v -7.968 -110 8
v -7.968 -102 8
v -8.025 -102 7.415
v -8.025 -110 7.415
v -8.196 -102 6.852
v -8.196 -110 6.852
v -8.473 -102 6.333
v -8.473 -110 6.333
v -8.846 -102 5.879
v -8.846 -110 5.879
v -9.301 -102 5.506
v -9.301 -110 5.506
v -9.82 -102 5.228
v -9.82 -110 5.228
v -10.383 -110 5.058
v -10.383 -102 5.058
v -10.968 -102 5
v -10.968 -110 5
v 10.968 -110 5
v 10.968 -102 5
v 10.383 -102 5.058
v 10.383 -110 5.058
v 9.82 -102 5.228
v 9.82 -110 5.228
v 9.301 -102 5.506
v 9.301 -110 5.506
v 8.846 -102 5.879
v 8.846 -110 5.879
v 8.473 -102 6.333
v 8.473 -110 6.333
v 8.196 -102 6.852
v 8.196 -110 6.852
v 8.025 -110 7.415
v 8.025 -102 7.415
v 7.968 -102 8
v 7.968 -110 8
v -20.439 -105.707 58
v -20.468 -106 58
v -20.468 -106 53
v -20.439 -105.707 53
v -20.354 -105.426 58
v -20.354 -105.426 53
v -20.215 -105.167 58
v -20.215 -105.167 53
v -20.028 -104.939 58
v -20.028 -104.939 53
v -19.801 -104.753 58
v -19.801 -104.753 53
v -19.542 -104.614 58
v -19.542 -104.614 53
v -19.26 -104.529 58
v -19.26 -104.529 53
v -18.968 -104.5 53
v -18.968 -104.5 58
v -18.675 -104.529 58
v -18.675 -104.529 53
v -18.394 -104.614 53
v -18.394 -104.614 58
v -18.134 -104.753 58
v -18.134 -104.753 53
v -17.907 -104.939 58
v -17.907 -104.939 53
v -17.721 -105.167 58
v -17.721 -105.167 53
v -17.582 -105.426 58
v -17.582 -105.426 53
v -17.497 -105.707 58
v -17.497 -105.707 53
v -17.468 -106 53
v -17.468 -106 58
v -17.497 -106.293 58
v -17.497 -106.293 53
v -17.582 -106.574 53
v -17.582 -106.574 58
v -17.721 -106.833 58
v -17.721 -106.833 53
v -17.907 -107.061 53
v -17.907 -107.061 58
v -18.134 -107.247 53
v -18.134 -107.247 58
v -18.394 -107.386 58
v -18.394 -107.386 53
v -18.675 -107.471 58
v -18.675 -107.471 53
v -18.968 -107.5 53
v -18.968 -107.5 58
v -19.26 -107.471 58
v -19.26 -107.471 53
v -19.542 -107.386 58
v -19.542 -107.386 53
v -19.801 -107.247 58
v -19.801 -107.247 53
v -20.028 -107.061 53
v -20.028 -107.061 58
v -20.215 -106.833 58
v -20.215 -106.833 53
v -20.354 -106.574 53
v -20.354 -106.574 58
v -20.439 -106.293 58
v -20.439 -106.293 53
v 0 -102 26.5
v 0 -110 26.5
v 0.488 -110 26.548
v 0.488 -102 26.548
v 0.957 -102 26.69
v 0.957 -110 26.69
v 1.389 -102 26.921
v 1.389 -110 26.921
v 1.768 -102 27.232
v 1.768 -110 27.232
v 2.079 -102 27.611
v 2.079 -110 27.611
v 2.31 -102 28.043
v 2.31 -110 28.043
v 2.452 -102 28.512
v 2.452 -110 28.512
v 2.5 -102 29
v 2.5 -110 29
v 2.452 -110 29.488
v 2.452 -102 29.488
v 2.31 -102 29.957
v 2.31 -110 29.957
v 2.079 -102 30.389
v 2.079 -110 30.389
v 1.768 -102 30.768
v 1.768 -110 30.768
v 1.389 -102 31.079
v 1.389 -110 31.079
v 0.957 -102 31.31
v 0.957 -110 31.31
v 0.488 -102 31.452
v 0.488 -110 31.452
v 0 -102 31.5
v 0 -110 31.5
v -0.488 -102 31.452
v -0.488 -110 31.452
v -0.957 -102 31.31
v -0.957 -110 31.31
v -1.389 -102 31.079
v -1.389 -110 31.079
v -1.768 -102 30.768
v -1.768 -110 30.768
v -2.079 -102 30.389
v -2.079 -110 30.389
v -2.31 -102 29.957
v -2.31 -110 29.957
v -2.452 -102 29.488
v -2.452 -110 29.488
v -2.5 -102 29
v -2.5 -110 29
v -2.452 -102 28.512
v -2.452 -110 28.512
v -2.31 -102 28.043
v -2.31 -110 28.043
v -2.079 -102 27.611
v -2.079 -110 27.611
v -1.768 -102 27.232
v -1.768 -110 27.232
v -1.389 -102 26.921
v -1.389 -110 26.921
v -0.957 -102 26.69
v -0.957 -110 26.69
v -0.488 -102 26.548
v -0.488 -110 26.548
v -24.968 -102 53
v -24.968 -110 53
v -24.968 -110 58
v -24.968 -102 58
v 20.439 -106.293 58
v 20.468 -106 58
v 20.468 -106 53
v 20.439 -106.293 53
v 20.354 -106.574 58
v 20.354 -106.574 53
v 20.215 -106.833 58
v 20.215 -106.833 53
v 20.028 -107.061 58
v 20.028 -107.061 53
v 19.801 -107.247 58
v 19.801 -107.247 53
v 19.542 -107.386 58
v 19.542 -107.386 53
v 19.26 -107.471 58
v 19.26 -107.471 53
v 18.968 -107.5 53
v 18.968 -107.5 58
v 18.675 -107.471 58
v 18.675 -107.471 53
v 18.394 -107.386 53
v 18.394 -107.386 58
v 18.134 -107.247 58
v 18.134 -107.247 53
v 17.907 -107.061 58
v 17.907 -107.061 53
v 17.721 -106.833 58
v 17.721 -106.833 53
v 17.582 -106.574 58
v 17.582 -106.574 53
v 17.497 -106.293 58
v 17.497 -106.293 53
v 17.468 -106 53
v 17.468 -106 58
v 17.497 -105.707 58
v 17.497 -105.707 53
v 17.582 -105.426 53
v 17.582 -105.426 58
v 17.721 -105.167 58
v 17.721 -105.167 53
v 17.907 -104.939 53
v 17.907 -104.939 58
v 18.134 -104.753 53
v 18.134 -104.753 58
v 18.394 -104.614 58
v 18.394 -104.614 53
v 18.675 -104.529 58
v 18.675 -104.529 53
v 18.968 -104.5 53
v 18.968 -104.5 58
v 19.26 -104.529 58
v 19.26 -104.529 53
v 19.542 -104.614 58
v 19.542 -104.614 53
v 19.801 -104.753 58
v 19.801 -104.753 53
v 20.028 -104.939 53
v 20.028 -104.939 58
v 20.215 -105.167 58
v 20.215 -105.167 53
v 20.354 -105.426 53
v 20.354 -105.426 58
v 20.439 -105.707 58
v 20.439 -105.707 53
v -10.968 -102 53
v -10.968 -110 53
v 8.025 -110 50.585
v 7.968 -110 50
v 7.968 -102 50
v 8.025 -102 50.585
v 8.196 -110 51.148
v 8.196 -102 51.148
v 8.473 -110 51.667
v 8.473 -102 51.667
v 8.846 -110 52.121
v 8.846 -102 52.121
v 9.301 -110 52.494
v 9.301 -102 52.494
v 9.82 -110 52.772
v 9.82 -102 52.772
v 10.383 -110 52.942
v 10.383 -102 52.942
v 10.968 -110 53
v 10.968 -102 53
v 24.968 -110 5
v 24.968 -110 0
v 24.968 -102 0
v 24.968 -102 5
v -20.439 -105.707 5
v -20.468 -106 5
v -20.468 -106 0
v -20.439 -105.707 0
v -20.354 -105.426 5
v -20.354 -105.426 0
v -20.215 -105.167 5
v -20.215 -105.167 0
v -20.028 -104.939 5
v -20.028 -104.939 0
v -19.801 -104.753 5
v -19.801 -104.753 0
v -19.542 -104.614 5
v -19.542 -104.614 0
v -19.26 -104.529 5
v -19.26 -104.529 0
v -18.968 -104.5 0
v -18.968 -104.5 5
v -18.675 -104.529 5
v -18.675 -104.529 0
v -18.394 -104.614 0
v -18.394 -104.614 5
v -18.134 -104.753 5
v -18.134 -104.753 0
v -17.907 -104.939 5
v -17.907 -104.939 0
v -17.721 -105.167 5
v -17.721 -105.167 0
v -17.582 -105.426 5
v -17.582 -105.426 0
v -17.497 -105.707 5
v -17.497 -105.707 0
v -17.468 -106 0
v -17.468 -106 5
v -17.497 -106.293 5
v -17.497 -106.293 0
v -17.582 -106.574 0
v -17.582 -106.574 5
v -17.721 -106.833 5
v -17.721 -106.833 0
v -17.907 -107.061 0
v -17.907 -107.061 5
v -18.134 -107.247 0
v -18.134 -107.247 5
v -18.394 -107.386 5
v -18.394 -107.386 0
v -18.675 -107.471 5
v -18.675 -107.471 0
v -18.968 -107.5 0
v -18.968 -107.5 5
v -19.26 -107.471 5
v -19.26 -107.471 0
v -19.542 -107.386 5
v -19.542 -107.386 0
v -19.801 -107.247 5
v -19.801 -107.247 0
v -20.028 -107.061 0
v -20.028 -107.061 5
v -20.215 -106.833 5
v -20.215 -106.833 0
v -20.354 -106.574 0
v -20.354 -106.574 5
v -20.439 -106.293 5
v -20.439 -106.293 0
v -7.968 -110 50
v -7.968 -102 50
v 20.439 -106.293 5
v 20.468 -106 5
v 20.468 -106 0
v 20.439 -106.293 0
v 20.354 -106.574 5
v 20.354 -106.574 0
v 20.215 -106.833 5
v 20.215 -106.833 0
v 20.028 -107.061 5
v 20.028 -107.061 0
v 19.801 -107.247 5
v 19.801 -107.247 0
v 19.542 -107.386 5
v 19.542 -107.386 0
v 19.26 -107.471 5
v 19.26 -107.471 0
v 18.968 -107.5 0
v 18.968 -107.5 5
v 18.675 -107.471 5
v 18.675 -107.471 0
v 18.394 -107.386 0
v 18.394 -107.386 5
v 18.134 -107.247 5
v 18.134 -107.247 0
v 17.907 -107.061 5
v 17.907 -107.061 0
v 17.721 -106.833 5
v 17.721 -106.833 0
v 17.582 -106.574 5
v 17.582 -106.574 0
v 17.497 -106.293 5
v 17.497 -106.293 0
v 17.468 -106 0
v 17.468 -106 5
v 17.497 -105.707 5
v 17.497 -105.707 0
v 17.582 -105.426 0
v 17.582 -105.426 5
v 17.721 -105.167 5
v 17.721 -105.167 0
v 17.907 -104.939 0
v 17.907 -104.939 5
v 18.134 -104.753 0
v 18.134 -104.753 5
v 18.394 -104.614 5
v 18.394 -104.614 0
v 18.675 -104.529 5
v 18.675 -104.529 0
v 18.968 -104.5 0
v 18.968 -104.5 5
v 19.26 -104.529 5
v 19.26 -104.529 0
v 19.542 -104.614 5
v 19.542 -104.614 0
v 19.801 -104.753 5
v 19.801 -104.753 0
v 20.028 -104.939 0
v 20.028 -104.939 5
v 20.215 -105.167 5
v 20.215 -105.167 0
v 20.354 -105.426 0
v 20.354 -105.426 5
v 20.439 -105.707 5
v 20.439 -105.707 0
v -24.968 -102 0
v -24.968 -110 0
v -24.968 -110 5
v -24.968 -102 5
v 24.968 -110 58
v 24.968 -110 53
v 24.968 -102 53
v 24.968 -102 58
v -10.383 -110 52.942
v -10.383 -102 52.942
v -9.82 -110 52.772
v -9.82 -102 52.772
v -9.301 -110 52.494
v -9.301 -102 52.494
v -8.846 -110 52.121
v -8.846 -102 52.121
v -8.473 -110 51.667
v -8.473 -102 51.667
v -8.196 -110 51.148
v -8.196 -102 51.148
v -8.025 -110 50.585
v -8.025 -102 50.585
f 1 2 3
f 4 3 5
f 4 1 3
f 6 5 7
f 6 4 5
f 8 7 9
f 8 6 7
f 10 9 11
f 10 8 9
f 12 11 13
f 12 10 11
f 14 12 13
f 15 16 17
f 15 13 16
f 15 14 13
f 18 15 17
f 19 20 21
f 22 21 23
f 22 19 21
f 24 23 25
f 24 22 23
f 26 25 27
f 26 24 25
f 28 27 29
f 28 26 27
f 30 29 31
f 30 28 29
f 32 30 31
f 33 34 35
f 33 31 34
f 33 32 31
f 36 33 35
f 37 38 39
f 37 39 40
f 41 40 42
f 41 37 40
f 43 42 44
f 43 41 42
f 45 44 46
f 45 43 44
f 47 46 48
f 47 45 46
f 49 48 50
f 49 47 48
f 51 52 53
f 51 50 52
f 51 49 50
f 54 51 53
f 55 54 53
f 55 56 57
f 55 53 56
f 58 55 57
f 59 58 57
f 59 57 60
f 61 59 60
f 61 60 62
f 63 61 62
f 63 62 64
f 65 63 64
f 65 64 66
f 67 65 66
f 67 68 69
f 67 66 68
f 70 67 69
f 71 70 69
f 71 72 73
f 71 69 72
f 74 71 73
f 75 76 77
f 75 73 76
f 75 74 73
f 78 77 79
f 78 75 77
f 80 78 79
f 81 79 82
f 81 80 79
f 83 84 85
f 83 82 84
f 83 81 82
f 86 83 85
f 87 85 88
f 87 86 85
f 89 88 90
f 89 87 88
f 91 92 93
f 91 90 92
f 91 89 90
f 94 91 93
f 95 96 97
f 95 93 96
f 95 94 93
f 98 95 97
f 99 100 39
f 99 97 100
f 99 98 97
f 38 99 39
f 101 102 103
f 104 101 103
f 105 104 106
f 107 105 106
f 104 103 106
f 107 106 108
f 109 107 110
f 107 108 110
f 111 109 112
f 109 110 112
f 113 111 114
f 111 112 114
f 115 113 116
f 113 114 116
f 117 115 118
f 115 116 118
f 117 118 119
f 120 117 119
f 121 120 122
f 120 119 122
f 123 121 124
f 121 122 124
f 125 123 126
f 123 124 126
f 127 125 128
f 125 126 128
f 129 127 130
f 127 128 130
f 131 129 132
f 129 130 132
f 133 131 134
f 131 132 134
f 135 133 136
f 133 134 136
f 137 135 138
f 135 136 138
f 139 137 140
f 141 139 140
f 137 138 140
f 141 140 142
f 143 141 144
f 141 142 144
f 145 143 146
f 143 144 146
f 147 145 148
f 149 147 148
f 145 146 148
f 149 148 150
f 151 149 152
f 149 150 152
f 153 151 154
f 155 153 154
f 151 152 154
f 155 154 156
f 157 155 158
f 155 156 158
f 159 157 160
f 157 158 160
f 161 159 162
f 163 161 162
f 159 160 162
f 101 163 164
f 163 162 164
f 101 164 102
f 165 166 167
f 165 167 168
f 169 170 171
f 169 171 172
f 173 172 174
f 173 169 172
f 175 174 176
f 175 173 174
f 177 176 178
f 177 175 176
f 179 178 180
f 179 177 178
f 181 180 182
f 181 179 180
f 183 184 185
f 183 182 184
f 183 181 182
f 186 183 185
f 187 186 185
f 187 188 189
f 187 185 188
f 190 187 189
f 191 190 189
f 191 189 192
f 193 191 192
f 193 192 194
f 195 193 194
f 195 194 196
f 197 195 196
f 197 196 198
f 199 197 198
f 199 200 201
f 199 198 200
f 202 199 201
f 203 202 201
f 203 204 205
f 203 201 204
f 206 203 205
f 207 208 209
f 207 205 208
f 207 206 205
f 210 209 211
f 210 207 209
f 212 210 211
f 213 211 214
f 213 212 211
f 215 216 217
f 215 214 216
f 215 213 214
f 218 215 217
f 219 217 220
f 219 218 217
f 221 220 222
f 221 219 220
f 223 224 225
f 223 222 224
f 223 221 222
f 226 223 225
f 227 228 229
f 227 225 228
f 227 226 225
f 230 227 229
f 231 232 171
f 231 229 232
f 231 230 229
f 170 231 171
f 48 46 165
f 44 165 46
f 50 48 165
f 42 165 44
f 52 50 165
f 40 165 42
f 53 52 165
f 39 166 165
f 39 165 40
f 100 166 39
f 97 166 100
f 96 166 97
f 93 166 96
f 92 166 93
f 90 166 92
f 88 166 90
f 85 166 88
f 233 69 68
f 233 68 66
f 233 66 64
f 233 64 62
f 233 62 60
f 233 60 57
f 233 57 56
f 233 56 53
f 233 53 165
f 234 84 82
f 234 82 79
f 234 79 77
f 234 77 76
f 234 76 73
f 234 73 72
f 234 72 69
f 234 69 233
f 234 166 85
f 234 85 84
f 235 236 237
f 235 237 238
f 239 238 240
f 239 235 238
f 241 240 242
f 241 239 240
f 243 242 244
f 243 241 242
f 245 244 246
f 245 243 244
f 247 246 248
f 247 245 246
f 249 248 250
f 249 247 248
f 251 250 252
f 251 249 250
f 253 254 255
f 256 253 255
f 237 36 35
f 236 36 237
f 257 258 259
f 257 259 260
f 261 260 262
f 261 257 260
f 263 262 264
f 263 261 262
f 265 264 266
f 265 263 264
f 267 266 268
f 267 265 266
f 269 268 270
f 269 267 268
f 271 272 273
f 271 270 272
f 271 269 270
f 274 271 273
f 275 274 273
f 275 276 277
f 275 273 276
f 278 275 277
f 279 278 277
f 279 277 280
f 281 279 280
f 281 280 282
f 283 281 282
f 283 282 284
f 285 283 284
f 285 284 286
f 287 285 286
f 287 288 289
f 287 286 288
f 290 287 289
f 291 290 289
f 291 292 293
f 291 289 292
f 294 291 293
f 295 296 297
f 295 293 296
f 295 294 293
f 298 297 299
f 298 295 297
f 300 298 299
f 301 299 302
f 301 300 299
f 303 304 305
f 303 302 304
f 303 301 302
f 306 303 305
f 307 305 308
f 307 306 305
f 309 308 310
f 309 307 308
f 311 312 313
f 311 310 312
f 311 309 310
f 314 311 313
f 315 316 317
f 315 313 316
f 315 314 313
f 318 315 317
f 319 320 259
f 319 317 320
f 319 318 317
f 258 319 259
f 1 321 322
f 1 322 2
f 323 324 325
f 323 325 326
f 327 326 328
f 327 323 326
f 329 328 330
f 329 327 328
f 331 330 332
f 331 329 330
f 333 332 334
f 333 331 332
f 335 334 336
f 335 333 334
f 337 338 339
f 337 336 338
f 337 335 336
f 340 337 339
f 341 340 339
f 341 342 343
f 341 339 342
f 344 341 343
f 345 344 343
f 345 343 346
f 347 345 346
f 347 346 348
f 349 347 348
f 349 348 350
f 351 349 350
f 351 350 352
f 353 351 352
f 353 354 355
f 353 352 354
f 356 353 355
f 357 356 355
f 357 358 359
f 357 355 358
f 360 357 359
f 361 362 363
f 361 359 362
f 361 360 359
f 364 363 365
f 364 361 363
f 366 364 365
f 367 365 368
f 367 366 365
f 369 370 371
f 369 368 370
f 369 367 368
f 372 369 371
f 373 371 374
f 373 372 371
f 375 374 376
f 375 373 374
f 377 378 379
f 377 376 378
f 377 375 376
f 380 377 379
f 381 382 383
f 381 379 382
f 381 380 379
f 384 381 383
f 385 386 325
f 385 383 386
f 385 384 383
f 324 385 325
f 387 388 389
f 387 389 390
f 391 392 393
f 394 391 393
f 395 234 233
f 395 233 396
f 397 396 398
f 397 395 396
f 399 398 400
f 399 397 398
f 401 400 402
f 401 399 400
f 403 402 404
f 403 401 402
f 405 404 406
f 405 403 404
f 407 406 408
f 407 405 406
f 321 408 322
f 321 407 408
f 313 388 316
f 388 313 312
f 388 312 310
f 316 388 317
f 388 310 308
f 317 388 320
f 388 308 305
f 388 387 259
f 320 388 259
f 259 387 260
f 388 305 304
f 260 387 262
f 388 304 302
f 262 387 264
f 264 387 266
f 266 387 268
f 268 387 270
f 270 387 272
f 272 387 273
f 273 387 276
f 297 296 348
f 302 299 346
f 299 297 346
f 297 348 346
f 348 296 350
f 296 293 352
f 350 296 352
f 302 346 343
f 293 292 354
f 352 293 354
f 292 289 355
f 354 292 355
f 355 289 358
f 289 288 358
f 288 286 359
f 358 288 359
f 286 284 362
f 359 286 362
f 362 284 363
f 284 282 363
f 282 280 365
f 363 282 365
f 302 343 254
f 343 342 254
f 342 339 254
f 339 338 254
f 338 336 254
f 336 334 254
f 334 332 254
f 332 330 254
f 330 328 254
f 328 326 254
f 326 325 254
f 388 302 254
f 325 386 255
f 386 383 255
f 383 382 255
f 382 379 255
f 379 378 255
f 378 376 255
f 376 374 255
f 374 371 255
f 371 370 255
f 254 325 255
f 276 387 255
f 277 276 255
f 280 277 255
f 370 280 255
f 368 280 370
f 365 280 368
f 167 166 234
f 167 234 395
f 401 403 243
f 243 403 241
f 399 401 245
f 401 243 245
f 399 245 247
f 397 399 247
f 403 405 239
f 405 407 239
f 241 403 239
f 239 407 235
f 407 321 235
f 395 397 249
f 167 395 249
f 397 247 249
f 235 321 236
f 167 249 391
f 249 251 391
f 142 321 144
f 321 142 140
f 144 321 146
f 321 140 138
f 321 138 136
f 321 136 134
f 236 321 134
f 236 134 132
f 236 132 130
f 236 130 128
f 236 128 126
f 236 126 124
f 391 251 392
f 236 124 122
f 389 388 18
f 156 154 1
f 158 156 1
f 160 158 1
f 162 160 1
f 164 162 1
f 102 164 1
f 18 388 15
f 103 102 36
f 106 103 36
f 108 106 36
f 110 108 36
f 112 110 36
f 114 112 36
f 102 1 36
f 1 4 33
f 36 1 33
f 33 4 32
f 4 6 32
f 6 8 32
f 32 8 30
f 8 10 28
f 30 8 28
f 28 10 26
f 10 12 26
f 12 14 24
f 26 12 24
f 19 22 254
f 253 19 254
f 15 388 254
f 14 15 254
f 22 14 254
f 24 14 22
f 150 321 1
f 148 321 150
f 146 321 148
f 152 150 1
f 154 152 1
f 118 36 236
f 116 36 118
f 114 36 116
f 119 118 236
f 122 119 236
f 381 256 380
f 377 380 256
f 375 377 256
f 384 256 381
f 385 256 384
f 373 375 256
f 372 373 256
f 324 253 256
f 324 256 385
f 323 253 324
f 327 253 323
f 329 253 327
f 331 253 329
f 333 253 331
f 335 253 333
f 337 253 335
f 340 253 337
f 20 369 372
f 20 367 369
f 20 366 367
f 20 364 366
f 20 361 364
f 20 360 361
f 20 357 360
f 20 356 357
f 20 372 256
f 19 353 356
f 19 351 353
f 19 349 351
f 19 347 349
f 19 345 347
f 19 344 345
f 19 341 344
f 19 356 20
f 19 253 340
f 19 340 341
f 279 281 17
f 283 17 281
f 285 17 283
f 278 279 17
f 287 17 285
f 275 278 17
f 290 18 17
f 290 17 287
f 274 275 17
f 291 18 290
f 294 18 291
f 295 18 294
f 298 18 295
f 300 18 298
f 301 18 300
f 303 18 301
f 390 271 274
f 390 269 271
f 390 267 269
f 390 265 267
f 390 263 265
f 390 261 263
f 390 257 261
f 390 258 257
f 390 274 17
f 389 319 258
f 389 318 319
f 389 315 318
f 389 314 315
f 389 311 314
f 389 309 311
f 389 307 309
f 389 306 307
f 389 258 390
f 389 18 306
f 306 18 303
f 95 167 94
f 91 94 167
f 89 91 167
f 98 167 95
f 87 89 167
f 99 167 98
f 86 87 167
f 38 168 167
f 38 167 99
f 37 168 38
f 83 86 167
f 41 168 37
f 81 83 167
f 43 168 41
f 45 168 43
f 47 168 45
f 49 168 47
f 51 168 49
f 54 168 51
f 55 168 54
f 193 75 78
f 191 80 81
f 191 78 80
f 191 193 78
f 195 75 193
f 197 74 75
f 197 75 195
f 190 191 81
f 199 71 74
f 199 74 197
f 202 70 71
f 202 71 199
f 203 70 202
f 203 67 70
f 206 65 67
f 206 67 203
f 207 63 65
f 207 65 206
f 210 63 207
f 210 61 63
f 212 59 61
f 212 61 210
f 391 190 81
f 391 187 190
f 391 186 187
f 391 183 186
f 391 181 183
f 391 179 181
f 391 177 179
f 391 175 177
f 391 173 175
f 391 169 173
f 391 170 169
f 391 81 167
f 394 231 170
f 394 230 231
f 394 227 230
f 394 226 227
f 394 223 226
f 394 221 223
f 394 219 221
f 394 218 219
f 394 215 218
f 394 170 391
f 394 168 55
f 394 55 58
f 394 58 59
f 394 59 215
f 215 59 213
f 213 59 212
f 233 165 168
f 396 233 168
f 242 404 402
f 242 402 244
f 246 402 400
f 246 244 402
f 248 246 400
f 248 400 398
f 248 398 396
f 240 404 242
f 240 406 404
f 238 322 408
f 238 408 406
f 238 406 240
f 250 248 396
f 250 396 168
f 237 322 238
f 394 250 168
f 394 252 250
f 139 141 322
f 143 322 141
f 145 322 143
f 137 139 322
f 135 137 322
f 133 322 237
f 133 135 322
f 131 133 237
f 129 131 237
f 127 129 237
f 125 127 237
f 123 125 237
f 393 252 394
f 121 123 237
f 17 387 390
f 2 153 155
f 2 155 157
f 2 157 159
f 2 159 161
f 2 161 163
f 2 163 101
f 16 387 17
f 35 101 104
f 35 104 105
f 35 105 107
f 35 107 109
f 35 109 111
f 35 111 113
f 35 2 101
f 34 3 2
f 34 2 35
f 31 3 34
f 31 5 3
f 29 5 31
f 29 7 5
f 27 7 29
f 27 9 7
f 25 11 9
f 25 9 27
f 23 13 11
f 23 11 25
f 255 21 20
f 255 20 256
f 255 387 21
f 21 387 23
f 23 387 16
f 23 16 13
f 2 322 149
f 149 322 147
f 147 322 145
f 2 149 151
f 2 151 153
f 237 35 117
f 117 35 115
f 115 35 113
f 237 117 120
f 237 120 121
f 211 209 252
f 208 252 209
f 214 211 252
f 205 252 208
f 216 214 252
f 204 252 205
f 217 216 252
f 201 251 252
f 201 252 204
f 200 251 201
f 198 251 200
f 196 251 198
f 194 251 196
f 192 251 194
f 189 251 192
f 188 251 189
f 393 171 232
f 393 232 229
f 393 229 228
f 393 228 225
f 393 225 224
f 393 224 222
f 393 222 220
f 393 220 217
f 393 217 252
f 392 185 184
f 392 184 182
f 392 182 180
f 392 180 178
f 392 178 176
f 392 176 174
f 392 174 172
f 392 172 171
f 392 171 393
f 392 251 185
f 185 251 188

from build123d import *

# Parameters (mm, degrees)
SKETCH_1_W               = 49.93556627
SKETCH_1_H               = 8
EXTRUDE_1_DEPTH          = 58
CUT_EXTRUDE_1_DEPTH      = 56
CUT_EXTRUDE_2_DEPTH      = 66
CUT_EXTRUDE_2_DEPTH_BACK = 10
SKETCH_4_R               = 1.5
SKETCH_3_R               = 2.5
CUT_EXTRUDE_3_DEPTH      = 8


with BuildPart() as part:
    # 草图1 → 凸台-拉伸1 (new body)
    with BuildSketch(Plane.XY):
        with Locations((0, -106)):
            Rectangle(SKETCH_1_W, SKETCH_1_H)
    extrude(amount=EXTRUDE_1_DEPTH)

    # 草图2 → 切除-拉伸1 (cut)
    with BuildSketch(Plane.XZ.offset(110)):
        with BuildLine():
            Line((-24.967783135, 53), (-10.967783135, 53))
            ThreePointArc((-10.967783135, 53), (-8.846462792, 52.121320344), (-7.967783135, 50))
            Line((-7.967783135, 50), (-7.967783135, 8))
            ThreePointArc((-7.967783135, 8), (-8.846462792, 5.878679656), (-10.967783135, 5))
            Line((-10.967783135, 5), (-24.967783135, 5))
            Line((-24.967783135, 5), (-24.967783135, 53))
        make_face()
        with BuildLine():
            Line((24.967783135, 5), (10.967783135, 5))
            ThreePointArc((10.967783135, 5), (8.846462792, 5.878679656), (7.967783135, 8))
            Line((7.967783135, 8), (7.967783135, 50))
            ThreePointArc((7.967783135, 50), (8.846462792, 52.121320344), (10.967783135, 53))
            Line((10.967783135, 53), (24.967783135, 53))
            Line((24.967783135, 53), (24.967783135, 5))
        make_face()
    extrude(amount=-CUT_EXTRUDE_1_DEPTH, mode=Mode.SUBTRACT)

    # 草图4 → 切除-拉伸2 (cut, two sides: drawn at the far end of the back side and taken through both)
    with BuildSketch(Plane(origin=(0, 0, 53), x_dir=(-1, 0, 0), z_dir=(0, 0, -1)).offset(-CUT_EXTRUDE_2_DEPTH_BACK)):
        with Locations((18.967783135, -106)):
            Circle(SKETCH_4_R)
        with Locations(Location((-18.967783135, -106, 0), (0, 0, 180))):
            Circle(SKETCH_4_R)
    extrude(amount=CUT_EXTRUDE_2_DEPTH + CUT_EXTRUDE_2_DEPTH_BACK, mode=Mode.SUBTRACT)

    # 草图3 → 切除-拉伸3 (cut)
    with BuildSketch(Plane.XZ.offset(110)):
        with Locations(Location((0, 29, 0), (0, 0, 270))):
            Circle(SKETCH_3_R)
    extrude(amount=-CUT_EXTRUDE_3_DEPTH, mode=Mode.SUBTRACT)


solid = part.part
